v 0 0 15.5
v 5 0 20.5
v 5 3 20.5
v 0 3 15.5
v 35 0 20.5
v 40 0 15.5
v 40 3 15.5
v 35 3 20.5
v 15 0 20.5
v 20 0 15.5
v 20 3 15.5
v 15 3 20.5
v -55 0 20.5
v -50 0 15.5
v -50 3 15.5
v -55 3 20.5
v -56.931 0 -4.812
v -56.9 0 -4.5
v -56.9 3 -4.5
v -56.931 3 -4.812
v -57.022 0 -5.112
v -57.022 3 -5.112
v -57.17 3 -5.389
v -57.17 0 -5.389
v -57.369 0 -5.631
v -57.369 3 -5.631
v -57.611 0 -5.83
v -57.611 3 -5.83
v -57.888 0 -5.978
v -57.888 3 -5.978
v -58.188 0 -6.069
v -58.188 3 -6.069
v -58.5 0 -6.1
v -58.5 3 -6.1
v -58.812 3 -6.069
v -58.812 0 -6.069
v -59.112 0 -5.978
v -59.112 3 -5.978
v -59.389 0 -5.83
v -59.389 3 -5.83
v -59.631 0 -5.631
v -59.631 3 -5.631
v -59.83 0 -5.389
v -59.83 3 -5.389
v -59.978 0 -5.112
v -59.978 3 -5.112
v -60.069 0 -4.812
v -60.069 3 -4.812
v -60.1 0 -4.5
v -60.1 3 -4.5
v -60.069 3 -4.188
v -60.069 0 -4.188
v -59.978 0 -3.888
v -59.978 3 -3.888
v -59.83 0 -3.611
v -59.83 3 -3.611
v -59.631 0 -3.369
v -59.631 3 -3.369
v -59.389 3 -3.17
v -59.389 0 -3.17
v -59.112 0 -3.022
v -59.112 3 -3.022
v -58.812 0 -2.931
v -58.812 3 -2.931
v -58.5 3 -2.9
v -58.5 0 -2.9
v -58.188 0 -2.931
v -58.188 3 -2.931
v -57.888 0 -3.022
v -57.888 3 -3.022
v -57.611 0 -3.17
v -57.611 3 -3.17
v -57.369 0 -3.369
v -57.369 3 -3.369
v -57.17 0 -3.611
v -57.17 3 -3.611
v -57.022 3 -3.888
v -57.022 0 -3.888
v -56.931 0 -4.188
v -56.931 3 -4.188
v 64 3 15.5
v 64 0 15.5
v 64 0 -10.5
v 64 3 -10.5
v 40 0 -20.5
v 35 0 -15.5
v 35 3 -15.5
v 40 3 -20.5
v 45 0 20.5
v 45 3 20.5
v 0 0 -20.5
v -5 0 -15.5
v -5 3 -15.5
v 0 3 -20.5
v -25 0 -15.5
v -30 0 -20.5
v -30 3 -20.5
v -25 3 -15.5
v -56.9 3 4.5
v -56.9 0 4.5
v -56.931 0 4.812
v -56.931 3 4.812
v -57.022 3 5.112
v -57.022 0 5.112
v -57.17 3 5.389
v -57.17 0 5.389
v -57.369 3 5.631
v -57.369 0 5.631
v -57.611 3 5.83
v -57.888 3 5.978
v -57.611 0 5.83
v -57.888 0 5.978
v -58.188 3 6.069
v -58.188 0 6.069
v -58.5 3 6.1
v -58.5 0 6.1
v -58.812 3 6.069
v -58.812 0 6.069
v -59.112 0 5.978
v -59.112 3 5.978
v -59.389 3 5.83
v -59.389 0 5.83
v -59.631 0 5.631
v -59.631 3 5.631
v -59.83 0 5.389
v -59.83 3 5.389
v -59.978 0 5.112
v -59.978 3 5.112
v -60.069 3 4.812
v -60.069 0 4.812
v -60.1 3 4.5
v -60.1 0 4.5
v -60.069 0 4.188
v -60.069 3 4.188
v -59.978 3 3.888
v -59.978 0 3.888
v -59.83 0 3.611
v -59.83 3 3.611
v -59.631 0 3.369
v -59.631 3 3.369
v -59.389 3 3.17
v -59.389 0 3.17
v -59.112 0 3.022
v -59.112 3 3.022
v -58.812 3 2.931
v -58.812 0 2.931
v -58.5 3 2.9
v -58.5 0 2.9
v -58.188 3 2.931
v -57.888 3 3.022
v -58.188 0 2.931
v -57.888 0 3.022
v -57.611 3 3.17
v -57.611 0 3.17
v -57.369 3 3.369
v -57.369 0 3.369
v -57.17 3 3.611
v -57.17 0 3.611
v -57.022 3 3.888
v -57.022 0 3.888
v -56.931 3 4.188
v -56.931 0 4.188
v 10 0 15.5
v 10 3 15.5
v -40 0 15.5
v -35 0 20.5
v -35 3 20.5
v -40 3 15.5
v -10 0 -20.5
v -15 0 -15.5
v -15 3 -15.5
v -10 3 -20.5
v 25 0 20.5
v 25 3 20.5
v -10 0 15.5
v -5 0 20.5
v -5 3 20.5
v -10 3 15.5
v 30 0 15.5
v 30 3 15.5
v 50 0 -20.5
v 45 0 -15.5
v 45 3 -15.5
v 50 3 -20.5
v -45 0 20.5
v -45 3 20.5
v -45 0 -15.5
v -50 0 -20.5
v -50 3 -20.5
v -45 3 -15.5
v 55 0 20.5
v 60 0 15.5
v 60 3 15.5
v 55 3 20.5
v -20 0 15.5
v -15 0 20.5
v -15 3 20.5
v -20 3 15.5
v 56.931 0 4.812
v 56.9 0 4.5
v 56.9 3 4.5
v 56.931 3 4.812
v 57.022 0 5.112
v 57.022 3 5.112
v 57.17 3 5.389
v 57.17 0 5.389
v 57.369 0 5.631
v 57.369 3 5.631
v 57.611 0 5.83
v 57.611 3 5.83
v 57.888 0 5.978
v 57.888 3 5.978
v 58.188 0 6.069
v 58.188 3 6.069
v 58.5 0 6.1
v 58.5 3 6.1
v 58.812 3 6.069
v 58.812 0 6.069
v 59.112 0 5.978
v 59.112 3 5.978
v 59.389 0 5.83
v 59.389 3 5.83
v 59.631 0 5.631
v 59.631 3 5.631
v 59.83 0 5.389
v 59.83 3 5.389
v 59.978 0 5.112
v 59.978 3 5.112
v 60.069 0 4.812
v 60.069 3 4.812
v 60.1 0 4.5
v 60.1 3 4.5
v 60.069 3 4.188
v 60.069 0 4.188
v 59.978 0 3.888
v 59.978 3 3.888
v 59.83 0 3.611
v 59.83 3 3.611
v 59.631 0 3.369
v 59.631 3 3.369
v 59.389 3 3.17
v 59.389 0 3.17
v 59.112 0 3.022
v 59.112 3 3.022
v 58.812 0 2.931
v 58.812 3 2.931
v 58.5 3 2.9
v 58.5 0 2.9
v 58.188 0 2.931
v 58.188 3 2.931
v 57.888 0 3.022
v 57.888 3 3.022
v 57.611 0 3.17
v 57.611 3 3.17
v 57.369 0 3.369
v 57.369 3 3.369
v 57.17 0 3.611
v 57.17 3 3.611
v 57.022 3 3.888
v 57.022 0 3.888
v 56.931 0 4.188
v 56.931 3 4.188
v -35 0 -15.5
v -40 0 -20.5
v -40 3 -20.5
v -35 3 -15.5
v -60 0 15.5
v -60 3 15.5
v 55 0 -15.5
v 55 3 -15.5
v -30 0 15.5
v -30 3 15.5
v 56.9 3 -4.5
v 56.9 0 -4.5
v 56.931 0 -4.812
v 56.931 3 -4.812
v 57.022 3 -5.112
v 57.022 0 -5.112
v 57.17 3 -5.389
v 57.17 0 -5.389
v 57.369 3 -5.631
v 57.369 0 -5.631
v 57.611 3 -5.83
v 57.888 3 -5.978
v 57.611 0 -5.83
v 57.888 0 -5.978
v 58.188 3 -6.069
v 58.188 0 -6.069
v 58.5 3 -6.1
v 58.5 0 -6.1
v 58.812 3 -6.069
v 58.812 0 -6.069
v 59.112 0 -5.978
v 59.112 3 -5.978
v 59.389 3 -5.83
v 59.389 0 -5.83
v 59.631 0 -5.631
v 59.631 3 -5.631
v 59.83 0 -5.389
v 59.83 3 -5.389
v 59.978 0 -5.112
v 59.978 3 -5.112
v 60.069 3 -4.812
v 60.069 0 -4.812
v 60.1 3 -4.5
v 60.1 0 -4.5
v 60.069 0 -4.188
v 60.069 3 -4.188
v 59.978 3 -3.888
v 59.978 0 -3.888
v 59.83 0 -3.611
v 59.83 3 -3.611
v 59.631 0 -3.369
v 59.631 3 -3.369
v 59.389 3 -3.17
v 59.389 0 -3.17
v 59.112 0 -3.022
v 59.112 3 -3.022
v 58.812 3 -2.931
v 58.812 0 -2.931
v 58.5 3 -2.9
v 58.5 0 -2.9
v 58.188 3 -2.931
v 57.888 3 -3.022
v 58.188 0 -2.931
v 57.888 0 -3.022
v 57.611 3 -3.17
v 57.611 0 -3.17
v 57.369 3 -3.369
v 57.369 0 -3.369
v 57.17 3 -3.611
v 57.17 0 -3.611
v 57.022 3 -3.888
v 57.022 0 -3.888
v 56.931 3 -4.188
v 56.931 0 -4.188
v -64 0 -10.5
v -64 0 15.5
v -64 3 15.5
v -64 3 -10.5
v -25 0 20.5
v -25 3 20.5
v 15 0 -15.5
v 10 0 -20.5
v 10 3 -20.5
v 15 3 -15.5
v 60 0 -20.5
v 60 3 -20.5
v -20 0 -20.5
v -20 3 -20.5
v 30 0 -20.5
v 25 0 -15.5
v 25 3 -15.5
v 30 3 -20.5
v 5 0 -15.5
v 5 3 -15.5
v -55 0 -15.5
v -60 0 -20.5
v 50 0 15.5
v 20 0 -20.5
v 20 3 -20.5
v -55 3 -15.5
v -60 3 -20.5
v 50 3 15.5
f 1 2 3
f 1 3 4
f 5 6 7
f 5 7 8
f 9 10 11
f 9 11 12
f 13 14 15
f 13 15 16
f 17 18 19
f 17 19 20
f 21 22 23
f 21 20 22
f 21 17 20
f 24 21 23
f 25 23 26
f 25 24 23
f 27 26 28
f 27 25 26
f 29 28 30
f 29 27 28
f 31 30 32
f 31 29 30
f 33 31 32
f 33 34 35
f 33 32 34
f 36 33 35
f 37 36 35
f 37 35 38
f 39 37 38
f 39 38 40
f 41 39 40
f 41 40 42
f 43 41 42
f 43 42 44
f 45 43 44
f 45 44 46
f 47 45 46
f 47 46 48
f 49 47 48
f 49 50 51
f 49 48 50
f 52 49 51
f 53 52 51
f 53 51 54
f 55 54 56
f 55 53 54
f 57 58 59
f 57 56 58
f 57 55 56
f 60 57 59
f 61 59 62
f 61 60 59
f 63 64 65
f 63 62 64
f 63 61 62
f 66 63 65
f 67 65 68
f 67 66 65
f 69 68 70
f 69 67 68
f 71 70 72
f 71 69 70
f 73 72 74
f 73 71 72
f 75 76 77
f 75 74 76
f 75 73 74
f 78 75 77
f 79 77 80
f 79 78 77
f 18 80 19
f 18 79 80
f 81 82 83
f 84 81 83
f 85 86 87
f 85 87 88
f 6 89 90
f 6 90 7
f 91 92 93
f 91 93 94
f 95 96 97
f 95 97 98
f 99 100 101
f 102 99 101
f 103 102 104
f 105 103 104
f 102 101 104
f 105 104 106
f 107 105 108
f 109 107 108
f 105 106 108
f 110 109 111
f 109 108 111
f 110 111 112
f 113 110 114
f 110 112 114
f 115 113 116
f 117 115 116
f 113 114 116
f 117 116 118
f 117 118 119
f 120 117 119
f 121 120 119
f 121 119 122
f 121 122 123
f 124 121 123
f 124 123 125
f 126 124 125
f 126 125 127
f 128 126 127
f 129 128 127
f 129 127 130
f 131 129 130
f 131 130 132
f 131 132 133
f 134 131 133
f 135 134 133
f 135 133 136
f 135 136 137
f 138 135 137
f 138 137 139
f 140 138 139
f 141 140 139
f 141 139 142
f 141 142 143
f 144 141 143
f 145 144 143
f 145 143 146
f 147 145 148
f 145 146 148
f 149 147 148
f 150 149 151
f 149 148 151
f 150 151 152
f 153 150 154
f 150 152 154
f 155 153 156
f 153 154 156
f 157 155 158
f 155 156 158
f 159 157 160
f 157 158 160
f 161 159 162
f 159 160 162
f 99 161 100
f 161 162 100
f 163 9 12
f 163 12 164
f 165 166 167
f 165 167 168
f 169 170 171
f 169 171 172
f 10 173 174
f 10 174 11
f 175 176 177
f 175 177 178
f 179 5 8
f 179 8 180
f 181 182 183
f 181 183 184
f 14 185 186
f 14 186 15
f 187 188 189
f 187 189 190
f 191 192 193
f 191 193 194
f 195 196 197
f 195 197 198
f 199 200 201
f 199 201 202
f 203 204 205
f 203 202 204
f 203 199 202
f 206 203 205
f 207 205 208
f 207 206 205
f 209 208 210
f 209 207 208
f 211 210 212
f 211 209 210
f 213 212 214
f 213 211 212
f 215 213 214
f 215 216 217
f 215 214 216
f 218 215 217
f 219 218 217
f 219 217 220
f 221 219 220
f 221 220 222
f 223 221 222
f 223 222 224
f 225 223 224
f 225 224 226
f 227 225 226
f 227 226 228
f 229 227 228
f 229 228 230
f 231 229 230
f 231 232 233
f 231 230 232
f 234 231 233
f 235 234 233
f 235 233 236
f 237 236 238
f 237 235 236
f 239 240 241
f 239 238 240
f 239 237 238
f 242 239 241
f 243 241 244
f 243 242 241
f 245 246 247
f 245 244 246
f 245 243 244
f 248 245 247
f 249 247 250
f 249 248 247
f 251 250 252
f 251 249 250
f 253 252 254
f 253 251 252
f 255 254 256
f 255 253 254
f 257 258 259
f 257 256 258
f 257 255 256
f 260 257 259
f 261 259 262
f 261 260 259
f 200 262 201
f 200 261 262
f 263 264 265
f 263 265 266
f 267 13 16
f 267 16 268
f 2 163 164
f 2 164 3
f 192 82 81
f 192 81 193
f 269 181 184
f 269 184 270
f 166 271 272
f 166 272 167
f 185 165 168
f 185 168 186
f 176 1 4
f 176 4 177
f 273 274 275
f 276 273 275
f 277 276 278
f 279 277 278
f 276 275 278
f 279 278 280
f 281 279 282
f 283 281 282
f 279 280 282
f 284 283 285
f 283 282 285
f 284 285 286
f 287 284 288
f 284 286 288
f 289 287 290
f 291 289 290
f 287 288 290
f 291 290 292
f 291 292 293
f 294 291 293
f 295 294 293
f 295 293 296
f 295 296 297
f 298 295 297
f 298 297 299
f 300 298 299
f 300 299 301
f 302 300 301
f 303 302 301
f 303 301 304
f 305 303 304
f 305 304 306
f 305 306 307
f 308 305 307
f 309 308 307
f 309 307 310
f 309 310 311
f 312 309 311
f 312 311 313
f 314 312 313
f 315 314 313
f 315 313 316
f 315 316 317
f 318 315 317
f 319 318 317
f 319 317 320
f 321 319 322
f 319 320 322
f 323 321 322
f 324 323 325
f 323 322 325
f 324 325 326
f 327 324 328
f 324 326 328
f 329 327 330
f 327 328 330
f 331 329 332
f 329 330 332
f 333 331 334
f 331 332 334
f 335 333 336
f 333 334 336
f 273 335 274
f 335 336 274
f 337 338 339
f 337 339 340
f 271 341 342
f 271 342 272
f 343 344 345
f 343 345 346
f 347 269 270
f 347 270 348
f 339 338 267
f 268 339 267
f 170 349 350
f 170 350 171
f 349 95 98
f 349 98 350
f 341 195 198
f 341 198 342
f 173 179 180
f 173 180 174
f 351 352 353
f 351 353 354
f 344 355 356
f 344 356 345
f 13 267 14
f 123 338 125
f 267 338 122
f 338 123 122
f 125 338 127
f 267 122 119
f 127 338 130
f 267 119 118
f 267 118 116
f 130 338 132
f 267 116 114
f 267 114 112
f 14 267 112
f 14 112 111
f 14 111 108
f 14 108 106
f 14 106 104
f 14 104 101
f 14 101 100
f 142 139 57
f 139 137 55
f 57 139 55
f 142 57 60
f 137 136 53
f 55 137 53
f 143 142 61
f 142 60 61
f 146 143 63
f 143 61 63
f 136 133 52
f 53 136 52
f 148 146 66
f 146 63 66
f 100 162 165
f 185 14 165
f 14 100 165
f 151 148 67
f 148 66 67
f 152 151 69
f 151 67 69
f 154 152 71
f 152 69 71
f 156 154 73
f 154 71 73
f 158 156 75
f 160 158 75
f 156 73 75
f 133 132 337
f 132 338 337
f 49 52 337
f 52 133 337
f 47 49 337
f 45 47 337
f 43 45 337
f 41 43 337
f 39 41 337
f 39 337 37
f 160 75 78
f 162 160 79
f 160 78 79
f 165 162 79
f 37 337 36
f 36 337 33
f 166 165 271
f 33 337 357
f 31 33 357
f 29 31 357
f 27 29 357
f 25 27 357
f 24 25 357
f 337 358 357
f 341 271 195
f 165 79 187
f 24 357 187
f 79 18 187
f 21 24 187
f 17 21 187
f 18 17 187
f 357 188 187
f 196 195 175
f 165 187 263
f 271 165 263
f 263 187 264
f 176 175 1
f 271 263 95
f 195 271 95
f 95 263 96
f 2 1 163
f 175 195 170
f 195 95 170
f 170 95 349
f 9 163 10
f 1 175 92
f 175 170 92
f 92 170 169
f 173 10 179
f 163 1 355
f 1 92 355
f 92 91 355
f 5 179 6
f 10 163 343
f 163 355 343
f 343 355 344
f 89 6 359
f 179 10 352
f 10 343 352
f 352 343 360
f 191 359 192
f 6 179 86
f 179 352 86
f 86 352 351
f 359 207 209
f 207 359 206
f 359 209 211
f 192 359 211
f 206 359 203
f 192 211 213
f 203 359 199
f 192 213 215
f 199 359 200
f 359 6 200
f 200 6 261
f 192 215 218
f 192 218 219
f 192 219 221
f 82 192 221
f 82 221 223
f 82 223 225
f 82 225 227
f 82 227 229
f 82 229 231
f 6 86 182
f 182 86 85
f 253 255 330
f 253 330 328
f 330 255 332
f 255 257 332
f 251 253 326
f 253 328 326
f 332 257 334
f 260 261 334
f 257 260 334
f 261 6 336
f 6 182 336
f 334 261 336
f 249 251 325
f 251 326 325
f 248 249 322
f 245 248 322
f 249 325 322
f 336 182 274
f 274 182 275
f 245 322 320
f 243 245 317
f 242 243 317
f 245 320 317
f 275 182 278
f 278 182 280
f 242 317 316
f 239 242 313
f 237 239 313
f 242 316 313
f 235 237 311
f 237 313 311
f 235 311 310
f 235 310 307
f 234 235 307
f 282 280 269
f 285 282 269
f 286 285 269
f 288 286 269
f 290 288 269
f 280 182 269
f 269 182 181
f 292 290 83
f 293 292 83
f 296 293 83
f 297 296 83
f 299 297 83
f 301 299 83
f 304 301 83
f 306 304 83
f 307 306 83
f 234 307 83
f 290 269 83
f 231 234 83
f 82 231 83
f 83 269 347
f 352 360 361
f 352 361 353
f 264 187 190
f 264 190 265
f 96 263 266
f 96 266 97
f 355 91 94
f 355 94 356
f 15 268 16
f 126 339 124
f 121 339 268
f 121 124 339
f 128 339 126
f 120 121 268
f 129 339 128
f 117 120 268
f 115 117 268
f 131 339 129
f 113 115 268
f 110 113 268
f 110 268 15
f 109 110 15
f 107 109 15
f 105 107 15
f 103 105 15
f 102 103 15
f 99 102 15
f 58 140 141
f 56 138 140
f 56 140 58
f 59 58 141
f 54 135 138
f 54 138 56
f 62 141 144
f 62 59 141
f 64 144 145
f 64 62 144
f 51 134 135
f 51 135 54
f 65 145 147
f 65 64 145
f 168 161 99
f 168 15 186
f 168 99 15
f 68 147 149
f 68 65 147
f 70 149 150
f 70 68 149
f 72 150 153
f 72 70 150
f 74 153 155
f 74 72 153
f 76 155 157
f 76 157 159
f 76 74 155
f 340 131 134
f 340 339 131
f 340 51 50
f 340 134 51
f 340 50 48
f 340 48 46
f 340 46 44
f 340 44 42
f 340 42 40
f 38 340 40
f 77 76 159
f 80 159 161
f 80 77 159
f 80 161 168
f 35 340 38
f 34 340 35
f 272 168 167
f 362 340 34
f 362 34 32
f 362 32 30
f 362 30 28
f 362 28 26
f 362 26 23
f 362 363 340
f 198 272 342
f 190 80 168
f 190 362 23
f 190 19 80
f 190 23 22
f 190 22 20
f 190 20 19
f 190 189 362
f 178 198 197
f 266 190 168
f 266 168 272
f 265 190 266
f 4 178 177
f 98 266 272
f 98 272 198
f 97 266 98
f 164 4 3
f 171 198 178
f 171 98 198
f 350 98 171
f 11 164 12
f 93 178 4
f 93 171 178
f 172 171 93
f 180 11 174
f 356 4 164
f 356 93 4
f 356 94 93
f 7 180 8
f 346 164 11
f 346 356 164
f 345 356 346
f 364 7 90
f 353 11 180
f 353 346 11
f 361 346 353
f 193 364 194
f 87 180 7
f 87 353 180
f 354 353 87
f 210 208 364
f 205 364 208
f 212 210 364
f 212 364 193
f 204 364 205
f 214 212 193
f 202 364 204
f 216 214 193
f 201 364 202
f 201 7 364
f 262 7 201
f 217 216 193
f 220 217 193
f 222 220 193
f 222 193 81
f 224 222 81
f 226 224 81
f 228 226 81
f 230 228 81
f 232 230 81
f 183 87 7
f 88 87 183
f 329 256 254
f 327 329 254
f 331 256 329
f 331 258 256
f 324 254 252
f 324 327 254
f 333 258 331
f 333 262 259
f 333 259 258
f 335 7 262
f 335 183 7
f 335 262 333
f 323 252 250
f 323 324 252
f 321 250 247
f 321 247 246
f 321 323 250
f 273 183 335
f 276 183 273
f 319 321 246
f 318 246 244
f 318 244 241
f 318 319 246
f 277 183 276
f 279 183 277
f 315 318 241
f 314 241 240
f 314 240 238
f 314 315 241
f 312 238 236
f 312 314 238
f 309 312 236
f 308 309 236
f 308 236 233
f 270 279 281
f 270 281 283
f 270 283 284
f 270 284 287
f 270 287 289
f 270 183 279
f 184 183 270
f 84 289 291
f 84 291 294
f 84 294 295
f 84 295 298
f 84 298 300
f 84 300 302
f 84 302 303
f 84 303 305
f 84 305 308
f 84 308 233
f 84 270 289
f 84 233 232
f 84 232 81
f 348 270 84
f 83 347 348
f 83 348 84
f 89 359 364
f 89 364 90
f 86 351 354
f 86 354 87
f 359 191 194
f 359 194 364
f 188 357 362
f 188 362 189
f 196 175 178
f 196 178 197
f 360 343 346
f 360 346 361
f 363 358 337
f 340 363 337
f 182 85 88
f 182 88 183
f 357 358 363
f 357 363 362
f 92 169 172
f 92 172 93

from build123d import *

# Parameters (mm, degrees)
SKETCH1_W               = 128
SKETCH1_H               = 41
BOSS_EXTRUDE1_DEPTH     = 3
CUT_EXTRUDE2_START      = -4
CUT_EXTRUDE2_DEPTH      = 5
LPATTERN3_COUNT         = 12
LPATTERN3_PITCH         = 10
CUT_EXTRUDE3_START      = -4
CUT_EXTRUDE3_DEPTH      = 5
LPATTERN5_COUNT         = 12
LPATTERN5_PITCH         = 10
CUT_EXTRUDE4_START      = -4
SKETCH6_R               = 1.6
CUT_EXTRUDE4_DEPTH      = 5
MIRROR3_START           = -4
MIRROR3_COPY_1_SKETCH_R = 1.6
MIRROR3_COPY_1_DEPTH    = 5
CUT_EXTRUDE5_START      = -4
CUT_EXTRUDE5_DEPTH      = 5
CUT_EXTRUDE6_START      = -4
SKETCH8_W               = 4
SKETCH8_H               = 5
CUT_EXTRUDE6_DEPTH      = 5


with BuildPart() as part:
    # Sketch1 → Boss-Extrude1 (new body)
    with BuildSketch(Plane(origin=(0, 0, 0), x_dir=(1, 0, 0), z_dir=(0, 1, 0))):
        Rectangle(SKETCH1_W, SKETCH1_H)
    extrude(amount=BOSS_EXTRUDE1_DEPTH)

    # Sketch2 → Cut-Extrude2 (cut)
    with BuildSketch(Plane(origin=(0, 3, 0), x_dir=(1, 0, 0), z_dir=(0, 1, 0)).offset(CUT_EXTRUDE2_START)):
        Polygon((-60, 20.5), (-55, 15.5), (-50, 20.5), align=None)
    cut_extrude2 = extrude(amount=CUT_EXTRUDE2_DEPTH, mode=Mode.SUBTRACT)

    # LPattern3: Cut-Extrude2 ×12
    with Locations(*[(i * LPATTERN3_PITCH, 0, 0) for i in range(1, LPATTERN3_COUNT)]):
        add(cut_extrude2, mode=Mode.SUBTRACT)

    # Sketch5 → Cut-Extrude3 (cut)
    with BuildSketch(Plane(origin=(0, 3, 0), x_dir=(1, 0, 0), z_dir=(0, 1, 0)).offset(CUT_EXTRUDE3_START)):
        Polygon((-55, -20.5), (-60, -15.5), (-60, -20.5), align=None)
        Polygon((-50, -15.5), (-55, -20.5), (-50, -20.5), align=None)
    cut_extrude3 = extrude(amount=CUT_EXTRUDE3_DEPTH, mode=Mode.SUBTRACT)

    # LPattern5: Cut-Extrude3 ×12
    with Locations(*[(i * LPATTERN5_PITCH, 0, 0) for i in range(1, LPATTERN5_COUNT)]):
        add(cut_extrude3, mode=Mode.SUBTRACT)

    # Sketch6 → Cut-Extrude4 (cut)
    with BuildSketch(Plane(origin=(0, 3, 0), x_dir=(1, 0, 0), z_dir=(0, 1, 0)).offset(CUT_EXTRUDE4_START)):
        with Locations((-58.5, 4.5)):
            Circle(SKETCH6_R)
    cut_extrude4 = extrude(amount=CUT_EXTRUDE4_DEPTH, mode=Mode.SUBTRACT)

    # Mirror2: Cut-Extrude4 across plane
    add(cut_extrude4.mirror(Plane(origin=(0, 0, 0), x_dir=(0, 0, 1), z_dir=(1, 0, 0))), mode=Mode.SUBTRACT)

    # Mirror3: Cut-Extrude4 across plane
    add(cut_extrude4.mirror(Plane.XY), mode=Mode.SUBTRACT)

    # Mirror3 copy 1 sketch → Mirror3 copy 1 (cut)
    with BuildSketch(Plane(origin=(0, 3, 0), x_dir=(-1, 0, 0), z_dir=(0, 1, 0)).offset(MIRROR3_START)):
        with Locations((-58.5, 4.5)):
            Circle(MIRROR3_COPY_1_SKETCH_R)
    extrude(amount=MIRROR3_COPY_1_DEPTH, mode=Mode.SUBTRACT)

    # Sketch7 → Cut-Extrude5 (cut)
    with BuildSketch(Plane(origin=(0, 3, 0), x_dir=(1, 0, 0), z_dir=(0, 1, 0)).offset(CUT_EXTRUDE5_START)):
        Polygon((-60, 20.5), (-64, 10.5), (-64, 20.5), align=None)
    cut_extrude5 = extrude(amount=CUT_EXTRUDE5_DEPTH, mode=Mode.SUBTRACT)

    # Mirror4: Cut-Extrude5 across plane
    add(cut_extrude5.mirror(Plane(origin=(0, 0, 0), x_dir=(0, 0, 1), z_dir=(1, 0, 0))), mode=Mode.SUBTRACT)

    # Sketch8 → Cut-Extrude6 (cut)
    with BuildSketch(Plane(origin=(0, 3, 0), x_dir=(1, 0, 0), z_dir=(0, 1, 0)).offset(CUT_EXTRUDE6_START)):
        with Locations((-62, -18)):
            Rectangle(SKETCH8_W, SKETCH8_H)
    cut_extrude6 = extrude(amount=CUT_EXTRUDE6_DEPTH, mode=Mode.SUBTRACT)

    # Mirror5: Cut-Extrude6 across plane
    add(cut_extrude6.mirror(Plane(origin=(0, 0, 0), x_dir=(0, 0, 1), z_dir=(1, 0, 0))), mode=Mode.SUBTRACT)


solid = part.part
